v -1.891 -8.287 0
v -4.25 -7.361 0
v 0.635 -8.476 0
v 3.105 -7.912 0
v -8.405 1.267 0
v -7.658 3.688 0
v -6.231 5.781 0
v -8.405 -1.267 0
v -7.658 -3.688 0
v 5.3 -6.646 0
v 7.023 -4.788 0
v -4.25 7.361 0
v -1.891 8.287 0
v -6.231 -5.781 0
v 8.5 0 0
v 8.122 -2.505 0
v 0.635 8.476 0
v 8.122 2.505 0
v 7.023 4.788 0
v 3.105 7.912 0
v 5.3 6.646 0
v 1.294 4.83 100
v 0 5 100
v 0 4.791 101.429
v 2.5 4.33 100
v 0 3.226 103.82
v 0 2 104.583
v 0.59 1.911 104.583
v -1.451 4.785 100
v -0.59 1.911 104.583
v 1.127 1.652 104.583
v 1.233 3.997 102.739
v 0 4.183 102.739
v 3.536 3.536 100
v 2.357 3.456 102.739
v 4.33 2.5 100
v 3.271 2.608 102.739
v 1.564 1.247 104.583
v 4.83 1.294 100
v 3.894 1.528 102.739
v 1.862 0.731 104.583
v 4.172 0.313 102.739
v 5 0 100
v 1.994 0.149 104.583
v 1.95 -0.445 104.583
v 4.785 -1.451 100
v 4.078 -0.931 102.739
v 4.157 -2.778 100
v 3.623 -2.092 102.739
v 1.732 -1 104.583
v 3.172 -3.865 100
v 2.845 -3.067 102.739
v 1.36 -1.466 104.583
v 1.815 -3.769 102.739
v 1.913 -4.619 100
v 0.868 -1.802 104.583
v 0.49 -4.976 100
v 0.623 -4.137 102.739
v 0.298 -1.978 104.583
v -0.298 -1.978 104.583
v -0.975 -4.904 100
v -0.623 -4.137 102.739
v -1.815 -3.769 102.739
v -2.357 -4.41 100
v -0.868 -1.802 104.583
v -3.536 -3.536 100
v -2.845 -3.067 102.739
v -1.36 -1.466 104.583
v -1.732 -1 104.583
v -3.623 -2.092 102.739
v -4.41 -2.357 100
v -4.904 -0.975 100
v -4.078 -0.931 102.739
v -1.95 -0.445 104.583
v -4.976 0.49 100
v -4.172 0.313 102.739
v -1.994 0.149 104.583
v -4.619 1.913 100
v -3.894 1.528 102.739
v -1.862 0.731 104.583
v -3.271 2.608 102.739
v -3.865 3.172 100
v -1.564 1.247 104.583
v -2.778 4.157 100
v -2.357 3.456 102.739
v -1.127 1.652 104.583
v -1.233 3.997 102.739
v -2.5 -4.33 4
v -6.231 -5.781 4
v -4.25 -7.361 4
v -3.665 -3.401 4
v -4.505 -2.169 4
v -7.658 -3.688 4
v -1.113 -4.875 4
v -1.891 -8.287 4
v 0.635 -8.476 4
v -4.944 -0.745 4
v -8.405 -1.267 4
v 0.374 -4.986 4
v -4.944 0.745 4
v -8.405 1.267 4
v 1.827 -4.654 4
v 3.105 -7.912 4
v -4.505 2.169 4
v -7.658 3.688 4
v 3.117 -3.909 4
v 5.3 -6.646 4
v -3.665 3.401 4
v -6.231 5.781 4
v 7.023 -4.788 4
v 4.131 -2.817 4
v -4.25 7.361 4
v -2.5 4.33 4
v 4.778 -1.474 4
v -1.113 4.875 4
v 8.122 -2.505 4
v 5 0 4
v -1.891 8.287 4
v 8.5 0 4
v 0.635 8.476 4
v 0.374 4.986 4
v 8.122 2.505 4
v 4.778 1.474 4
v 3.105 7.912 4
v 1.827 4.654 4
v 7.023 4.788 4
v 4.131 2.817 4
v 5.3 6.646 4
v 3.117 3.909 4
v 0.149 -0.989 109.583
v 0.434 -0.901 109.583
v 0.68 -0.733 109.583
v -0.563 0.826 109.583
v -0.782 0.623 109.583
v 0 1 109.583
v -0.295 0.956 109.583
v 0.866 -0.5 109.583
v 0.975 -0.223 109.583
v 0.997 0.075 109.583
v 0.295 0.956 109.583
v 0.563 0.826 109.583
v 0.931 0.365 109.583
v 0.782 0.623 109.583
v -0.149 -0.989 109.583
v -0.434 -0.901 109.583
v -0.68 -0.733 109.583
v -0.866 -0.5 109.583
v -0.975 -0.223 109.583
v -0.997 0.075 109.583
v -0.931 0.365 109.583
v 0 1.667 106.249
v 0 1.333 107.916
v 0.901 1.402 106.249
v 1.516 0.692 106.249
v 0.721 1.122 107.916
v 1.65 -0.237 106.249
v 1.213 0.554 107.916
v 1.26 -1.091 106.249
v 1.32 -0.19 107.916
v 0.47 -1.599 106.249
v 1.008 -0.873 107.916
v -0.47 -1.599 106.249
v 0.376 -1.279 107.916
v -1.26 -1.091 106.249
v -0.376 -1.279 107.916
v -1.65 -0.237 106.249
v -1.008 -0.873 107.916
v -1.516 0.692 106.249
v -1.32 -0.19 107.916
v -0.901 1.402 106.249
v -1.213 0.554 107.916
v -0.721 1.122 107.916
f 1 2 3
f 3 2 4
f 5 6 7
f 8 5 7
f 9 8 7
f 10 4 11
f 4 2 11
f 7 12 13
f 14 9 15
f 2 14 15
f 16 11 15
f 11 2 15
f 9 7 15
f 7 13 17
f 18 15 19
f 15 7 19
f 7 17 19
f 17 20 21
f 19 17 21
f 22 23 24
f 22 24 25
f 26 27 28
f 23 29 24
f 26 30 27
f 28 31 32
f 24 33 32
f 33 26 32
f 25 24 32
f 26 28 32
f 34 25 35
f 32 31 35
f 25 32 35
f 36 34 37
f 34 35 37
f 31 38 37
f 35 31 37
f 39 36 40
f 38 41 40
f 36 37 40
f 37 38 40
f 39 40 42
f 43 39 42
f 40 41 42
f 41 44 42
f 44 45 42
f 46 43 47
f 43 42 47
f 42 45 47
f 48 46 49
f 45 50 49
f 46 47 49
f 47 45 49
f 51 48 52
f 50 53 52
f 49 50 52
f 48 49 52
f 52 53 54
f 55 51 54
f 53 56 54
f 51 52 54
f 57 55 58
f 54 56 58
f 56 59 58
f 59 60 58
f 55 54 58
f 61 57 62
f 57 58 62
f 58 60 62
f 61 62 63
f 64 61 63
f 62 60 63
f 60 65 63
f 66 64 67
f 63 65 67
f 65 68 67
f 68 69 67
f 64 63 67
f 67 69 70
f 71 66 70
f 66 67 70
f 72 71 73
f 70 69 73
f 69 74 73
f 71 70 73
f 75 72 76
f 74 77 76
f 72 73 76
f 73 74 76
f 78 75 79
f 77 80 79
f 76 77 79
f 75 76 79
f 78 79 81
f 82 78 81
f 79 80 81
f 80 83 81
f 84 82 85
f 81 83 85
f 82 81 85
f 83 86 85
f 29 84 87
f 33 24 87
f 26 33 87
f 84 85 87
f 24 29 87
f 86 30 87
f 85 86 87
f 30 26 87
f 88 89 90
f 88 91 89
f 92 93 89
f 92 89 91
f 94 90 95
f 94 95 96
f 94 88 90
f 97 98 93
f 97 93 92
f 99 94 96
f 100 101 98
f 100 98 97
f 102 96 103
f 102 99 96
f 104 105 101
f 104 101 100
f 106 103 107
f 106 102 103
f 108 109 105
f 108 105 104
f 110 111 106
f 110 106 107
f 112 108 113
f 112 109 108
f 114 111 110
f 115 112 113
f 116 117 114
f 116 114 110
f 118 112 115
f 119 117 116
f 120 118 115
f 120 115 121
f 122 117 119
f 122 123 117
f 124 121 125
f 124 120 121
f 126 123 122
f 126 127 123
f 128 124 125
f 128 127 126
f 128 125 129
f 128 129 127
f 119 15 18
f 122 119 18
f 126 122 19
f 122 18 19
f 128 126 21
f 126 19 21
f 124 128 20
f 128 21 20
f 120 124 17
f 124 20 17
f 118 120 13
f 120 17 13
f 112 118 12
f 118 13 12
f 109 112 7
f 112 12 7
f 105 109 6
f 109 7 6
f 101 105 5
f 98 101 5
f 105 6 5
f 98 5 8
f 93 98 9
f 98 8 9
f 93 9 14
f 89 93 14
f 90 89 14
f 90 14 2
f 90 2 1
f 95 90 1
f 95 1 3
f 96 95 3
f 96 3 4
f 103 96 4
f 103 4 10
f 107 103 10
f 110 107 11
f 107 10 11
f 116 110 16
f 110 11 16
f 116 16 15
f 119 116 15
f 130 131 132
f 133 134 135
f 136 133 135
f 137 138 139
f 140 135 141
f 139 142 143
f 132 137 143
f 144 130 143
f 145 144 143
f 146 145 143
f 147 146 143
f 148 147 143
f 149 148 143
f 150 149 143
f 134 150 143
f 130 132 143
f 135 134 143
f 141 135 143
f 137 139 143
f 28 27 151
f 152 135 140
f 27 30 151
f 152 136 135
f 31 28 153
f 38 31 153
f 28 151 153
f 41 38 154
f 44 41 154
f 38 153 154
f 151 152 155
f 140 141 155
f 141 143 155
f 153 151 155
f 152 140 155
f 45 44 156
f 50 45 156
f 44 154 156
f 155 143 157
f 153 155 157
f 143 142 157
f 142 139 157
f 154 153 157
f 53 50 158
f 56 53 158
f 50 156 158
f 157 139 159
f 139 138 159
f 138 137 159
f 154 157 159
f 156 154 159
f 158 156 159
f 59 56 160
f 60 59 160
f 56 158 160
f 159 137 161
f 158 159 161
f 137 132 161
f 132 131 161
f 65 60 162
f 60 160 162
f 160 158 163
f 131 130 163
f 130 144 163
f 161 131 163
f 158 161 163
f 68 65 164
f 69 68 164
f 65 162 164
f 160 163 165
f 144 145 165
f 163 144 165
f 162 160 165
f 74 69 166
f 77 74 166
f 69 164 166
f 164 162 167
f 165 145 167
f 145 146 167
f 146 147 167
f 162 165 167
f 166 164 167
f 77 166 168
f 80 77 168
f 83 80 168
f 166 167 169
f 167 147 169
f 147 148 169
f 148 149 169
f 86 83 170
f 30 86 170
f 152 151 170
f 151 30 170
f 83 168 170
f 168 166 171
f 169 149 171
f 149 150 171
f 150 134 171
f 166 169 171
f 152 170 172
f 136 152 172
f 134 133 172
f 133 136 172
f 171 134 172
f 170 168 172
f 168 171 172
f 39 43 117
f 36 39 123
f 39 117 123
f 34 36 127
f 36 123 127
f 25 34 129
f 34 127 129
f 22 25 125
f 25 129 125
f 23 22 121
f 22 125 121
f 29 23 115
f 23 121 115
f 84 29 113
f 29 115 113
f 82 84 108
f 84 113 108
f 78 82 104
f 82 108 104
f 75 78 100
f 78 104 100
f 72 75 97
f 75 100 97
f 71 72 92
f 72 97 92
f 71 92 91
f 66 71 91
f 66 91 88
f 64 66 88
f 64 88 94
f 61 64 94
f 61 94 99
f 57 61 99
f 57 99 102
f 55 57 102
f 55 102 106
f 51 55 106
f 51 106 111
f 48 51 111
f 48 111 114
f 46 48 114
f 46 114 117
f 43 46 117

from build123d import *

# Parameters (mm, degrees)
F0_R     = 8.5
F1_DEPTH = 4
F2_R     = 5
F3_DEPTH = 100


with BuildPart() as f1:
    # F0 (on Top) → F1 (new body)
    with BuildSketch(Plane.XY):
        Circle(F0_R)
    extrude(amount=F1_DEPTH)

    # F2 (on Top) → F3 (join)
    with BuildSketch(Plane.XY):
        Circle(F2_R)
    extrude(amount=F3_DEPTH)

    # F4 (on Right) → F5 (revolve)
    with BuildSketch(Plane.YZ):
        with BuildLine():
            Line((0, 104.582576), (0, 100))
            Line((0, 100), (5, 100))
            ThreePointArc((5, 100), (4.1833, 102.738613), (2, 104.582576))
            Line((2, 104.582576), (0, 104.582576))
        make_face()
    revolve(axis=Axis((0, 0, 104.791288), (0, 0, -1)))

    # F4 (on Right) → F6 (revolve)
    with BuildSketch(Plane.YZ):
        with BuildLine():
            ThreePointArc((0, 105), (1.021548, 104.894532), (2, 104.582576))
            Line((2, 104.582576), (1, 109.582576))
            Line((1, 109.582576), (0, 109.582576))
            Line((0, 109.582576), (0, 105))
        make_face()
        with BuildLine():
            Line((0, 105), (0, 104.582576))
            Line((0, 104.582576), (2, 104.582576))
            ThreePointArc((2, 104.582576), (1.021548, 104.894532), (0, 105))
        make_face()
    revolve(axis=Axis((0, 0, 104.791288), (0, 0, -1)))


solid = f1.part
